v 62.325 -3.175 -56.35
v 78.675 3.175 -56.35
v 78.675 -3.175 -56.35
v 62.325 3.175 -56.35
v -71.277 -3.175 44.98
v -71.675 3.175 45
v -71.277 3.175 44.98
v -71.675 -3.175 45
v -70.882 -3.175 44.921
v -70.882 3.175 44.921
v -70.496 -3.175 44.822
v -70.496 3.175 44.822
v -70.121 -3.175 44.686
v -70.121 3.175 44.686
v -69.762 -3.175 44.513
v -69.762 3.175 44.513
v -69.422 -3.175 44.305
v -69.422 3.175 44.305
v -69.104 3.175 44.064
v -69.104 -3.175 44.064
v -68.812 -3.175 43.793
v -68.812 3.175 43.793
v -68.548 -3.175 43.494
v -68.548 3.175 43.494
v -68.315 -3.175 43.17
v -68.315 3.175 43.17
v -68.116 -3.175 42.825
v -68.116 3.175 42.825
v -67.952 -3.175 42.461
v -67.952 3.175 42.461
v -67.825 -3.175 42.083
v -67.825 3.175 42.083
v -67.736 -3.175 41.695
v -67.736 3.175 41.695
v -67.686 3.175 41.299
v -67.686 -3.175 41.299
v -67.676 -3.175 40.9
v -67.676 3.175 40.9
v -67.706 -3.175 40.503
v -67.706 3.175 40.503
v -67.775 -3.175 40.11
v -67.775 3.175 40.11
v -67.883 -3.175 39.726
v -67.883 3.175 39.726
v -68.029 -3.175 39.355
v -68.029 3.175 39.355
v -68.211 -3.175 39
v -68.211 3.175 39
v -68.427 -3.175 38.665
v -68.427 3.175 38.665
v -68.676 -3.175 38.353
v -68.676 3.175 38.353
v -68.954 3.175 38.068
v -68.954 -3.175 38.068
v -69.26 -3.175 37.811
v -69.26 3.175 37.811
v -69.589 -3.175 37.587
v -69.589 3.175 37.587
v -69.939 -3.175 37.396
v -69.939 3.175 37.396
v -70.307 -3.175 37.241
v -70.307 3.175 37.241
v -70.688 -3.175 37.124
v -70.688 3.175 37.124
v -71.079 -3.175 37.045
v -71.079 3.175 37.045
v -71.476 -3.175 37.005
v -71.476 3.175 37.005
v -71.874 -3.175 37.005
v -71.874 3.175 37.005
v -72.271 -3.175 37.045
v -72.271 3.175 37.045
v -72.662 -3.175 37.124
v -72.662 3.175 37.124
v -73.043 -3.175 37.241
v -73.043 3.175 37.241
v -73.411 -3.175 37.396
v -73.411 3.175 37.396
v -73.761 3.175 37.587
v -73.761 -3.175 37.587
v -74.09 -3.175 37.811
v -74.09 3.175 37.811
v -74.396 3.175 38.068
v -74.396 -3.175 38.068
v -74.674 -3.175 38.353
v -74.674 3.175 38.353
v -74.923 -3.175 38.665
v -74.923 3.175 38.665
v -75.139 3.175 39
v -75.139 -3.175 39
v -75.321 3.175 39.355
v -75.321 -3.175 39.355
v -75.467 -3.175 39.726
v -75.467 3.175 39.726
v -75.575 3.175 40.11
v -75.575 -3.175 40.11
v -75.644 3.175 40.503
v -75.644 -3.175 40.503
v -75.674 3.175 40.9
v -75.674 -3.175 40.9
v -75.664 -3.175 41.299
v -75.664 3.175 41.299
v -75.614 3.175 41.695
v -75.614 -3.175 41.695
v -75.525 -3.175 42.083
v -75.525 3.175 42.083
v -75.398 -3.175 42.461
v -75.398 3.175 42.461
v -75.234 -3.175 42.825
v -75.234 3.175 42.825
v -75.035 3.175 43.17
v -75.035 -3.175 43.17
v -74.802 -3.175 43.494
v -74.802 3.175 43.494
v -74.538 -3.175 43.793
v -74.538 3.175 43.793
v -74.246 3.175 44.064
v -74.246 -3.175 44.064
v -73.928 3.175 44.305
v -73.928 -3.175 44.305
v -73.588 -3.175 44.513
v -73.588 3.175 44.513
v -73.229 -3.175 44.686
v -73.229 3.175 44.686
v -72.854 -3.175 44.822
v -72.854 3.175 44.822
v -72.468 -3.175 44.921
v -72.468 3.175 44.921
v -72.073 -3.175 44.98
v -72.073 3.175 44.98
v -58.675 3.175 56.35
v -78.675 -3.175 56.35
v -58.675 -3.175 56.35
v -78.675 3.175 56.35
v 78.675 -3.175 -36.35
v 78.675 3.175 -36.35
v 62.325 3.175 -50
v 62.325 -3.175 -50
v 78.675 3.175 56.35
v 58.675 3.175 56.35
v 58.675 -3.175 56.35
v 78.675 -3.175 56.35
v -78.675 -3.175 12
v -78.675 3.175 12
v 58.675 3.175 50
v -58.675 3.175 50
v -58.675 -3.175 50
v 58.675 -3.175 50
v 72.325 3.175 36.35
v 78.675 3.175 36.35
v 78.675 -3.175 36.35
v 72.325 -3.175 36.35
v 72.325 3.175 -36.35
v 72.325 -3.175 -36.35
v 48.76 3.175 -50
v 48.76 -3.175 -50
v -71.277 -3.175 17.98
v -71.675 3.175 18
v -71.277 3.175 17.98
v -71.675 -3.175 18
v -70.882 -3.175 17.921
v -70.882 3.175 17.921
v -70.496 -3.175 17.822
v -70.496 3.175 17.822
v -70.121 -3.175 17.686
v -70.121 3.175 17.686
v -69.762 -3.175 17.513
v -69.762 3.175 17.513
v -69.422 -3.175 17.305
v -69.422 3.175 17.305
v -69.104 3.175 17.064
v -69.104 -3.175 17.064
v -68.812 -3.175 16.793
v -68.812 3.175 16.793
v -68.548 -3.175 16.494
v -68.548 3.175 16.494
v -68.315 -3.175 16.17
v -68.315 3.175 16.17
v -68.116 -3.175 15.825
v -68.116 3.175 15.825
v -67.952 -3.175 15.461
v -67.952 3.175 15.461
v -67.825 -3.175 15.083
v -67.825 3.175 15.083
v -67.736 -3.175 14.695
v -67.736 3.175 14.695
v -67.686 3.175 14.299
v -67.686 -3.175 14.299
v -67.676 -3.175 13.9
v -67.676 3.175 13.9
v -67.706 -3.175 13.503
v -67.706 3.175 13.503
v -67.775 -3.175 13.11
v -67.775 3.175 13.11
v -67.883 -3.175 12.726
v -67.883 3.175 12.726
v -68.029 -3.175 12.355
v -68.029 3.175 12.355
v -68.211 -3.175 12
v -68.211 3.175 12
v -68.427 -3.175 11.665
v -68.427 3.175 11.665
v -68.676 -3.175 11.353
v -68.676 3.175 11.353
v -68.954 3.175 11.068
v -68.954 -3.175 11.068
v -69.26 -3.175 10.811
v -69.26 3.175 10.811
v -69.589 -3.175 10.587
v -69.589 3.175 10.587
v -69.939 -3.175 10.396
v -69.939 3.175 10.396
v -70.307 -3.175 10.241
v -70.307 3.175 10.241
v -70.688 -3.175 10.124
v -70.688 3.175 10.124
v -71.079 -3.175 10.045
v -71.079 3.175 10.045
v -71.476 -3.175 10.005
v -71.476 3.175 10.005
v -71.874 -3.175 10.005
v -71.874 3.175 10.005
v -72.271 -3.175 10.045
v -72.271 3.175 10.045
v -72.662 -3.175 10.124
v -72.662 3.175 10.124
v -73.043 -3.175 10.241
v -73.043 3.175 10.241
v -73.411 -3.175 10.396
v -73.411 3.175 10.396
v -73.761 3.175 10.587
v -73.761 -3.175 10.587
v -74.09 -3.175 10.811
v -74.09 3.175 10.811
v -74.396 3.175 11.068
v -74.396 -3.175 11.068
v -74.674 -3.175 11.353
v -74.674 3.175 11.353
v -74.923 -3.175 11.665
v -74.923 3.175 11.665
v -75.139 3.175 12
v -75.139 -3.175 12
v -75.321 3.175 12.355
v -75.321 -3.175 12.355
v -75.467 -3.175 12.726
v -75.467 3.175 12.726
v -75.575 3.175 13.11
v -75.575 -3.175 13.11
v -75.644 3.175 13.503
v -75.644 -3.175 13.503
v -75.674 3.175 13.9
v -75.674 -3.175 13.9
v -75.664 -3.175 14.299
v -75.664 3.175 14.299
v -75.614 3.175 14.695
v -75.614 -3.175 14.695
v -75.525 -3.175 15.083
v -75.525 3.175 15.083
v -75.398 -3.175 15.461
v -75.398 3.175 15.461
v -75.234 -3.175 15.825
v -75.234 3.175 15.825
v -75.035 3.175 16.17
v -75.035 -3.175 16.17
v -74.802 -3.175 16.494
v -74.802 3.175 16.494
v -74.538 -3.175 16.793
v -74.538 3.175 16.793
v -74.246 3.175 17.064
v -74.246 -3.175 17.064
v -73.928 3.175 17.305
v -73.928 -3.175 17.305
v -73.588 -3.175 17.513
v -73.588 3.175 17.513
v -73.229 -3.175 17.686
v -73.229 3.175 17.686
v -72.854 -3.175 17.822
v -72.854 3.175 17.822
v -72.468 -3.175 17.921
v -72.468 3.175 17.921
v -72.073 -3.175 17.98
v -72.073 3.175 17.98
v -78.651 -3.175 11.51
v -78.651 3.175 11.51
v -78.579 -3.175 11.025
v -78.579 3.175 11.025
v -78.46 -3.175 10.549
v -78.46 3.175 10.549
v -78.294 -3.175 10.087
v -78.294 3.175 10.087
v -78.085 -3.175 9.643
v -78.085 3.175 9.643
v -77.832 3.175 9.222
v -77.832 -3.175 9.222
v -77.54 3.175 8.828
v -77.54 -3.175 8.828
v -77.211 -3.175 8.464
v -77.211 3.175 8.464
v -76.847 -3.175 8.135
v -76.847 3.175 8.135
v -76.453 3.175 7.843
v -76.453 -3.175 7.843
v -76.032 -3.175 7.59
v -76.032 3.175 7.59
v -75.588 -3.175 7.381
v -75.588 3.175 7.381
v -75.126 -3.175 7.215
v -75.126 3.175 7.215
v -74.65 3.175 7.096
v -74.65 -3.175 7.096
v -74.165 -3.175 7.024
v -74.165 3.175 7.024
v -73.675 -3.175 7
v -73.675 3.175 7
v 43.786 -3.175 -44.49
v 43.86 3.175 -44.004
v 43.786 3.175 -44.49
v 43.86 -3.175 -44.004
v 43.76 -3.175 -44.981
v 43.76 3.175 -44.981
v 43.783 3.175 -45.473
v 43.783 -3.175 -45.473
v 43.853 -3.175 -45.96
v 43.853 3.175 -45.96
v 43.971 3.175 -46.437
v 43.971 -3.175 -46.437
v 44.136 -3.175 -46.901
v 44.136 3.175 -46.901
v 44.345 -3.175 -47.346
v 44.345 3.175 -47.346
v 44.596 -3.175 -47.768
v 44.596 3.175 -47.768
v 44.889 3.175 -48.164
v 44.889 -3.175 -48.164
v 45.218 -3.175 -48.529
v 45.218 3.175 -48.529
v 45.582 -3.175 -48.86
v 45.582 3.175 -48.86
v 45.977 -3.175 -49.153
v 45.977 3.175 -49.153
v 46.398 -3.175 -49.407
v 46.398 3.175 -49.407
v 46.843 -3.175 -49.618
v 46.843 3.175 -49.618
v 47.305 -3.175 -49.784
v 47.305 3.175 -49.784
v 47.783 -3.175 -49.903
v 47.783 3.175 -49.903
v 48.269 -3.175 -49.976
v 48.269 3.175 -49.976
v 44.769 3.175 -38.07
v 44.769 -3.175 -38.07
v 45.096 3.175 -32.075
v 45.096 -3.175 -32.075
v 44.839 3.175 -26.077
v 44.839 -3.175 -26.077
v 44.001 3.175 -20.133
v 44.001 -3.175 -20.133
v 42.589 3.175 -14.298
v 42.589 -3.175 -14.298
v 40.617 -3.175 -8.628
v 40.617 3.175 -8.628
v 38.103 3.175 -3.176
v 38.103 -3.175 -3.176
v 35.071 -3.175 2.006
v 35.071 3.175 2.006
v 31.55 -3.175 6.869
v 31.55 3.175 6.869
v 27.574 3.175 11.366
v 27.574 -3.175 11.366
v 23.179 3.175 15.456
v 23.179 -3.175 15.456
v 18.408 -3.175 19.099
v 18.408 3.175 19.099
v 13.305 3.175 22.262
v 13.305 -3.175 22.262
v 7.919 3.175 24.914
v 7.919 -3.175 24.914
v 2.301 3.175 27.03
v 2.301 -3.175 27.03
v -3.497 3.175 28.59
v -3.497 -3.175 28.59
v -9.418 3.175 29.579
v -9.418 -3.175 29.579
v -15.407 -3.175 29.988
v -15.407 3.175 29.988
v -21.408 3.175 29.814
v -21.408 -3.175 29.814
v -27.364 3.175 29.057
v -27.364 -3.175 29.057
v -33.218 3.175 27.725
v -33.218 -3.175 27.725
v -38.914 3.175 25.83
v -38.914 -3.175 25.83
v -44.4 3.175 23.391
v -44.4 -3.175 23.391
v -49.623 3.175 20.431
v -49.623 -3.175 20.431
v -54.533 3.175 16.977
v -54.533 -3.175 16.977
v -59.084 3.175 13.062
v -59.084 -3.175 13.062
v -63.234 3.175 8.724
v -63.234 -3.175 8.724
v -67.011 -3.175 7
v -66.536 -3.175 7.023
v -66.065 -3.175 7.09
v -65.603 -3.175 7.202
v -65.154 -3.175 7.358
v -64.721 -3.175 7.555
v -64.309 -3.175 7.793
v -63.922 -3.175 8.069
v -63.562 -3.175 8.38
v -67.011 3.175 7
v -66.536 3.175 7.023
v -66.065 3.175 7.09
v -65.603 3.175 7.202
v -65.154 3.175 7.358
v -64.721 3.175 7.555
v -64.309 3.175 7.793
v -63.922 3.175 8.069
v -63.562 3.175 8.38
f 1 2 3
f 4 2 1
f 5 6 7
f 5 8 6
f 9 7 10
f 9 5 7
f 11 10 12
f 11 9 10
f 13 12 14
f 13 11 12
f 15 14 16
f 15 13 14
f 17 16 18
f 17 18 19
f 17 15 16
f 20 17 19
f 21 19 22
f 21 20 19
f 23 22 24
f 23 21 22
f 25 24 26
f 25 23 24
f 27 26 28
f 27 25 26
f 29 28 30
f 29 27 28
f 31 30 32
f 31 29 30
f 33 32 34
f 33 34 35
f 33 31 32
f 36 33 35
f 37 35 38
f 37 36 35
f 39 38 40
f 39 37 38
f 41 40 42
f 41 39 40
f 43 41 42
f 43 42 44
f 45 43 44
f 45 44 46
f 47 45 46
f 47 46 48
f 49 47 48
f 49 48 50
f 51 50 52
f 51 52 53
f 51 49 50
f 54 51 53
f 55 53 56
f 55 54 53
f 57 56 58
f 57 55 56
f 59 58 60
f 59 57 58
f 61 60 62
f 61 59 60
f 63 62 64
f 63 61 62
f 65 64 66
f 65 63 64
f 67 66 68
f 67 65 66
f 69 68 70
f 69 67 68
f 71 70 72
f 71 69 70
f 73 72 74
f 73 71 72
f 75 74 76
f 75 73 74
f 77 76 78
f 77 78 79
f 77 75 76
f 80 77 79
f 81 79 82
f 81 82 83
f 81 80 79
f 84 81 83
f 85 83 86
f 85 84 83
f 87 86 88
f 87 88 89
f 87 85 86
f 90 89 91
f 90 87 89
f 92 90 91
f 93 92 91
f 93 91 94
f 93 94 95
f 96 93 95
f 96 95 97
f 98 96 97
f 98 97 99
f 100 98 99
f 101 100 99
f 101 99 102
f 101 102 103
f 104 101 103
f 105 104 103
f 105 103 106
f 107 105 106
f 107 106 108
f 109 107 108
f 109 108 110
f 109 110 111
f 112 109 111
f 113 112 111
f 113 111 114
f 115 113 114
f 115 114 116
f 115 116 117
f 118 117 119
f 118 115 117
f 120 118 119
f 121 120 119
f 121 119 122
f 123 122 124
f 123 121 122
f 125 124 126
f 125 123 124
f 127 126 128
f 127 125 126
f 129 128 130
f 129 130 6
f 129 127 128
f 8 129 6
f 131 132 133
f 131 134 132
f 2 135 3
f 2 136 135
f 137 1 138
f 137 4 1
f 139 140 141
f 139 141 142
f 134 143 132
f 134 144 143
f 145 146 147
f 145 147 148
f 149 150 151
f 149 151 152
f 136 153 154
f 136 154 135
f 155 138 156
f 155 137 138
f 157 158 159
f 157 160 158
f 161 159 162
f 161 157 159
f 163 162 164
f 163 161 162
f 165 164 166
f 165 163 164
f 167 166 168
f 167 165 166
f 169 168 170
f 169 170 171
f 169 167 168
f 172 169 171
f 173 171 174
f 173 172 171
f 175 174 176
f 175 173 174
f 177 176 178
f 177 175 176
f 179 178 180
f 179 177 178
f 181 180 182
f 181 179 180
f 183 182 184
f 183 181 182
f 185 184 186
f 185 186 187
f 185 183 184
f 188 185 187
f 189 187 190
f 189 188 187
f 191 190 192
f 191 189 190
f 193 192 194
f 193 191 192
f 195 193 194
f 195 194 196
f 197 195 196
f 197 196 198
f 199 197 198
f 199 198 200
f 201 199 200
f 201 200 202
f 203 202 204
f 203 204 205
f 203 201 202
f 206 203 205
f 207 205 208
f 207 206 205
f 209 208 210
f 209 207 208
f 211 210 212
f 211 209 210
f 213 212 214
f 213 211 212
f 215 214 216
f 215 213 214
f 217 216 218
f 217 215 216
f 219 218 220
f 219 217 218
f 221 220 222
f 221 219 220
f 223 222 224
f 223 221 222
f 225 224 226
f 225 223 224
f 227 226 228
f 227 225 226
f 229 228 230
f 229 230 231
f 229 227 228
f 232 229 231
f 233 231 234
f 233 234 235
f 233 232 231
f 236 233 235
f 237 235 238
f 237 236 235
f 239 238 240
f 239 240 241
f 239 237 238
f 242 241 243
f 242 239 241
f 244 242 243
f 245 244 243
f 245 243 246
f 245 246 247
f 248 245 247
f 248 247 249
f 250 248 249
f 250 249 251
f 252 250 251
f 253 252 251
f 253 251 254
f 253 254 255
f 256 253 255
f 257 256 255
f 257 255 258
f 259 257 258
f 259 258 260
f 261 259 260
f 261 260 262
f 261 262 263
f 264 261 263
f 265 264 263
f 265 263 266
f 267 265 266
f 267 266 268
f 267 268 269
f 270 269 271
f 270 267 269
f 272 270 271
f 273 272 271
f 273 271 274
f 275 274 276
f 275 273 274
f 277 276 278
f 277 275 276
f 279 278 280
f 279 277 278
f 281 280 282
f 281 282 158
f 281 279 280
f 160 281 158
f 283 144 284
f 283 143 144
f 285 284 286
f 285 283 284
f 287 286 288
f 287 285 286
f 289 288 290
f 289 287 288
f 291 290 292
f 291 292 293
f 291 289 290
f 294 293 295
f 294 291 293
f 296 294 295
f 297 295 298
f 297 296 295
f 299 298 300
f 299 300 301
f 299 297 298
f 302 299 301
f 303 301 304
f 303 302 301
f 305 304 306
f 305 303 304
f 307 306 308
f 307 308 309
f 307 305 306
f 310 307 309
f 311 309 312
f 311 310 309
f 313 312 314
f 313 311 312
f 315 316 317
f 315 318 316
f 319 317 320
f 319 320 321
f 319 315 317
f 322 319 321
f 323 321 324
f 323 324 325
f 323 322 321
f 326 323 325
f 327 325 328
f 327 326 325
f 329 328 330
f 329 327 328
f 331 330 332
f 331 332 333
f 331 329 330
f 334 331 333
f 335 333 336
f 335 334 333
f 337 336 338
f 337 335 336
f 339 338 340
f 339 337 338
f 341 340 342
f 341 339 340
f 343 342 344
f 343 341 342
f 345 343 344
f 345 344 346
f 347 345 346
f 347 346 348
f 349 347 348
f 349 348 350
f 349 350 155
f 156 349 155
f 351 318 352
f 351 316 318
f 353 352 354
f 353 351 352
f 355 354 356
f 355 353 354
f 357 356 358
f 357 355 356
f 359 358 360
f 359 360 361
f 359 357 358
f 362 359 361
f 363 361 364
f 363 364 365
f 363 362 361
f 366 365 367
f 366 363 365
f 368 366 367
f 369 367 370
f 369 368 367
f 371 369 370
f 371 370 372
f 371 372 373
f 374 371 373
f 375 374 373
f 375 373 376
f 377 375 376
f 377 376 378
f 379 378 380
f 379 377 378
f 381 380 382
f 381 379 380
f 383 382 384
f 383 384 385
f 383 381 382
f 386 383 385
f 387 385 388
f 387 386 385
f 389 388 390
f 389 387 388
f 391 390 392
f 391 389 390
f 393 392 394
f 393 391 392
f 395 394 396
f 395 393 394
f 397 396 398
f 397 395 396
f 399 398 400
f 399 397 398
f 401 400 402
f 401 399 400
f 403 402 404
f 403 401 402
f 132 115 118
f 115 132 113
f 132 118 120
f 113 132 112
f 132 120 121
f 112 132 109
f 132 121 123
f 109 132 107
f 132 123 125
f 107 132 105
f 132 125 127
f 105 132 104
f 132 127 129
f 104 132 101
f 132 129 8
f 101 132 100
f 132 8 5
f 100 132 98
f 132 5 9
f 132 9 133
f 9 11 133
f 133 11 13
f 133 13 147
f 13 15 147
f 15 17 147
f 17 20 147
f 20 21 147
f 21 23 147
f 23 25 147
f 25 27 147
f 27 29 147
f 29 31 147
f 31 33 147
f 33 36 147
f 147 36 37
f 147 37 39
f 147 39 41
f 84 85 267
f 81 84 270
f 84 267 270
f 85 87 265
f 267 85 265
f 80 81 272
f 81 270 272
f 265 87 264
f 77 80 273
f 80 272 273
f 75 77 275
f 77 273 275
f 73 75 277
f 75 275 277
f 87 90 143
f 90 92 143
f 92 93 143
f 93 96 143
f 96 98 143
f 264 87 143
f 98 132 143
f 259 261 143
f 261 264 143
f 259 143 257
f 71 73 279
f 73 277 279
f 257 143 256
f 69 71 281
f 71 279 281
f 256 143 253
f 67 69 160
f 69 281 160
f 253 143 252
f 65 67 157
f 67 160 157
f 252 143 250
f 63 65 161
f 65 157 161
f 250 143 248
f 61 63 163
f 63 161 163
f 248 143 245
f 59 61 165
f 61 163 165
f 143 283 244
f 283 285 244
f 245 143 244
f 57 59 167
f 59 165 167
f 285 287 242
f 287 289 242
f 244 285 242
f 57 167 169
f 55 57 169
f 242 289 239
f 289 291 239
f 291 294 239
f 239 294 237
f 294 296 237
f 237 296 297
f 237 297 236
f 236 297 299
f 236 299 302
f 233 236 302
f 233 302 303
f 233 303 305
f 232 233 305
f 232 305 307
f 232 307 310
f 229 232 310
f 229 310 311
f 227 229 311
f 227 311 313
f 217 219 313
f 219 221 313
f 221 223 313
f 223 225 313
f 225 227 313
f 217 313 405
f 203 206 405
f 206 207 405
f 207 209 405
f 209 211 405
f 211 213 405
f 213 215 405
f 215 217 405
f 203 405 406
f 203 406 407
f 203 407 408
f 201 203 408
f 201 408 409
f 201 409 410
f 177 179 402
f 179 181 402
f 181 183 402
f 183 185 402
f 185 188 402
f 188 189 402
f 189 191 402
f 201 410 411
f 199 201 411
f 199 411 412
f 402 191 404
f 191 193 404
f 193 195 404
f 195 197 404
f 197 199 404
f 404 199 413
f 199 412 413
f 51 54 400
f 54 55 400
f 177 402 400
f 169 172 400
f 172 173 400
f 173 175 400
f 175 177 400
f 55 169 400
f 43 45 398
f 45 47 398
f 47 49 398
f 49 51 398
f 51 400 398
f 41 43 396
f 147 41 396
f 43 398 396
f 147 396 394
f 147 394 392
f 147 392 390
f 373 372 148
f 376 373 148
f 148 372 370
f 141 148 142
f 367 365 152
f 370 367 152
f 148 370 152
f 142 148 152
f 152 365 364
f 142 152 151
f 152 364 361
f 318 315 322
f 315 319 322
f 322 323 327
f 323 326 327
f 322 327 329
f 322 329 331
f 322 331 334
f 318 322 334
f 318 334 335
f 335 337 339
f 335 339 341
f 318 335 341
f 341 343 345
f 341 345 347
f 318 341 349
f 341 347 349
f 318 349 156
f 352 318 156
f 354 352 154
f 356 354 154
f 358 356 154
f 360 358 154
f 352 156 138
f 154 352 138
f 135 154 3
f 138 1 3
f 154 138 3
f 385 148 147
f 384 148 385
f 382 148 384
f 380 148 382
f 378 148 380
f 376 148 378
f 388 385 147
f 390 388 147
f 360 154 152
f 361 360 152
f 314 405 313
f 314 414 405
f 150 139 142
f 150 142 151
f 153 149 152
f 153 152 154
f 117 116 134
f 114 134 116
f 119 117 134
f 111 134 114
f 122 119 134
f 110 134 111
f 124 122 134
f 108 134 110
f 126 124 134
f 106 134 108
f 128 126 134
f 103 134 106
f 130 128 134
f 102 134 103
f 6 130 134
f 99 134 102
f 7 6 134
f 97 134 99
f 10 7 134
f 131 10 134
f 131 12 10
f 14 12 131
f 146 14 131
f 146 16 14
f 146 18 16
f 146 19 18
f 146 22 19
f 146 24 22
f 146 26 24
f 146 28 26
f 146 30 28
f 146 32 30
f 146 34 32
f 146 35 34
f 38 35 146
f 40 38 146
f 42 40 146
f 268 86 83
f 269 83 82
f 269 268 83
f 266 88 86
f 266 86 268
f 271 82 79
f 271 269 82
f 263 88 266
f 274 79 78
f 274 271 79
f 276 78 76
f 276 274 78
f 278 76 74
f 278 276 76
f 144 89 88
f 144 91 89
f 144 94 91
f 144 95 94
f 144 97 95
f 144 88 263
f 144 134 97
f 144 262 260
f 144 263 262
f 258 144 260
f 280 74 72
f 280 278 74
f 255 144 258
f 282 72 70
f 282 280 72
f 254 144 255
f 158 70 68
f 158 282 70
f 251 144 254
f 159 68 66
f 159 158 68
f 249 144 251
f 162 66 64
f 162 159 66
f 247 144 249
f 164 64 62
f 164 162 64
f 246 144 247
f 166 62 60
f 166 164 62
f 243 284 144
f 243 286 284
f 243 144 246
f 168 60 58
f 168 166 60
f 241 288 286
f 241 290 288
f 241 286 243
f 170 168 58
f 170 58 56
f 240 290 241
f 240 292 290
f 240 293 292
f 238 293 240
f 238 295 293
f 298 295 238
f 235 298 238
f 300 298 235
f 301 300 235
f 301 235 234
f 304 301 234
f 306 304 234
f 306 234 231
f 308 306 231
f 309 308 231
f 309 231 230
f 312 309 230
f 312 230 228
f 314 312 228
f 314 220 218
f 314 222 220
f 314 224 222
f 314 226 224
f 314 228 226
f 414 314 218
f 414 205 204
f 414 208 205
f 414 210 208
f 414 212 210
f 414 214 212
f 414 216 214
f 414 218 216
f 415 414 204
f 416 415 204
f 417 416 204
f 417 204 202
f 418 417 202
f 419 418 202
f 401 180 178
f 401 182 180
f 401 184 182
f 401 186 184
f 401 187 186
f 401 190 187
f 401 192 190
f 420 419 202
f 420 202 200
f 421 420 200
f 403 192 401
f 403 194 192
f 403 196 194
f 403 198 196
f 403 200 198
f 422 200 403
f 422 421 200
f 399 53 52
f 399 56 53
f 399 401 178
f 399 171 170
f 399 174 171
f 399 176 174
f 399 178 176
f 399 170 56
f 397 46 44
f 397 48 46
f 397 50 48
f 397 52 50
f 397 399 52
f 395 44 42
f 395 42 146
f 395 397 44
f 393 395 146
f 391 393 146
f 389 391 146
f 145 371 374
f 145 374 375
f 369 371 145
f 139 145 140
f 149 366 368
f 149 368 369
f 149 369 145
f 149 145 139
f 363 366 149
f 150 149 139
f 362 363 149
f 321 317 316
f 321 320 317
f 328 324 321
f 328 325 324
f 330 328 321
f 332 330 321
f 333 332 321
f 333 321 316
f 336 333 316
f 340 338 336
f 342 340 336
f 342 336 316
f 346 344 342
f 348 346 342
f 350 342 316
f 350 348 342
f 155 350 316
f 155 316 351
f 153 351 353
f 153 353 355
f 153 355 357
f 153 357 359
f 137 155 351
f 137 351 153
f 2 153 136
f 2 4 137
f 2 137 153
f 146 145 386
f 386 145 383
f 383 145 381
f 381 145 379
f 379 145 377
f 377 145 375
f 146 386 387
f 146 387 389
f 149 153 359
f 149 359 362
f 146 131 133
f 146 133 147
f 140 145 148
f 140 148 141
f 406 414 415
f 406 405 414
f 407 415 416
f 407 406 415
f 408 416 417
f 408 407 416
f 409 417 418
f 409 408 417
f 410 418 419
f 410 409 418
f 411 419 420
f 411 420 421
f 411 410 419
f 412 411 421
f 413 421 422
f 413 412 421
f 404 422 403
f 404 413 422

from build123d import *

# Parameters (mm, degrees)
SKETCH1_R           = 4
BOSS_EXTRUDE1_DEPTH = 3.175
FILLET1_R           = 5


with BuildPart() as part:
    # Sketch1 → Boss-Extrude1 (new, symmetric)
    with BuildSketch(Plane(origin=(0, 0, 0), x_dir=(1, 0, 0), z_dir=(0, 1, 0))):
        with BuildLine():
            Line((-78.675, -56.35), (-58.675, -56.35))
            Line((-58.675, -56.35), (-58.675, -50))
            Line((-58.675, -50), (58.675, -50))
            Line((58.675, -50), (58.675, -56.35))
            Line((58.675, -56.35), (78.675, -56.35))
            Line((78.675, -56.35), (78.675, -36.35))
            Line((78.675, -36.35), (72.325, -36.35))
            Line((72.325, -36.35), (72.325, 36.35))
            Line((72.325, 36.35), (78.675, 36.35))
            Line((78.675, 36.35), (78.675, 56.35))
            Line((78.675, 56.35), (62.325, 56.35))
            Line((62.325, 56.35), (62.325, 50))
            Line((62.325, 50), (42.325, 50))
            ThreePointArc((42.325, 50), (12.399475155, -22.753839327), (-64.675, -7))
            Line((-64.675, -7), (-78.675, -7))
            Line((-78.675, -7), (-78.675, -56.35))
        make_face()
        with Locations(Location((-71.675, -41, 0), (0, 0, 270))):
            Circle(SKETCH1_R, mode=Mode.SUBTRACT)
        with Locations(Location((-71.675, -14, 0), (0, 0, 270))):
            Circle(SKETCH1_R, mode=Mode.SUBTRACT)
    extrude(amount=BOSS_EXTRUDE1_DEPTH, both=True)

    # Fillet1
    fillet1_edges = [part.edges().sort_by_distance(p)[0] for p in [
        (-78.675, 0, 7),
        (-64.675, 0, 7),
        (42.325, 0, -50),
    ]]
    fillet(fillet1_edges, radius=FILLET1_R)


solid = part.part
